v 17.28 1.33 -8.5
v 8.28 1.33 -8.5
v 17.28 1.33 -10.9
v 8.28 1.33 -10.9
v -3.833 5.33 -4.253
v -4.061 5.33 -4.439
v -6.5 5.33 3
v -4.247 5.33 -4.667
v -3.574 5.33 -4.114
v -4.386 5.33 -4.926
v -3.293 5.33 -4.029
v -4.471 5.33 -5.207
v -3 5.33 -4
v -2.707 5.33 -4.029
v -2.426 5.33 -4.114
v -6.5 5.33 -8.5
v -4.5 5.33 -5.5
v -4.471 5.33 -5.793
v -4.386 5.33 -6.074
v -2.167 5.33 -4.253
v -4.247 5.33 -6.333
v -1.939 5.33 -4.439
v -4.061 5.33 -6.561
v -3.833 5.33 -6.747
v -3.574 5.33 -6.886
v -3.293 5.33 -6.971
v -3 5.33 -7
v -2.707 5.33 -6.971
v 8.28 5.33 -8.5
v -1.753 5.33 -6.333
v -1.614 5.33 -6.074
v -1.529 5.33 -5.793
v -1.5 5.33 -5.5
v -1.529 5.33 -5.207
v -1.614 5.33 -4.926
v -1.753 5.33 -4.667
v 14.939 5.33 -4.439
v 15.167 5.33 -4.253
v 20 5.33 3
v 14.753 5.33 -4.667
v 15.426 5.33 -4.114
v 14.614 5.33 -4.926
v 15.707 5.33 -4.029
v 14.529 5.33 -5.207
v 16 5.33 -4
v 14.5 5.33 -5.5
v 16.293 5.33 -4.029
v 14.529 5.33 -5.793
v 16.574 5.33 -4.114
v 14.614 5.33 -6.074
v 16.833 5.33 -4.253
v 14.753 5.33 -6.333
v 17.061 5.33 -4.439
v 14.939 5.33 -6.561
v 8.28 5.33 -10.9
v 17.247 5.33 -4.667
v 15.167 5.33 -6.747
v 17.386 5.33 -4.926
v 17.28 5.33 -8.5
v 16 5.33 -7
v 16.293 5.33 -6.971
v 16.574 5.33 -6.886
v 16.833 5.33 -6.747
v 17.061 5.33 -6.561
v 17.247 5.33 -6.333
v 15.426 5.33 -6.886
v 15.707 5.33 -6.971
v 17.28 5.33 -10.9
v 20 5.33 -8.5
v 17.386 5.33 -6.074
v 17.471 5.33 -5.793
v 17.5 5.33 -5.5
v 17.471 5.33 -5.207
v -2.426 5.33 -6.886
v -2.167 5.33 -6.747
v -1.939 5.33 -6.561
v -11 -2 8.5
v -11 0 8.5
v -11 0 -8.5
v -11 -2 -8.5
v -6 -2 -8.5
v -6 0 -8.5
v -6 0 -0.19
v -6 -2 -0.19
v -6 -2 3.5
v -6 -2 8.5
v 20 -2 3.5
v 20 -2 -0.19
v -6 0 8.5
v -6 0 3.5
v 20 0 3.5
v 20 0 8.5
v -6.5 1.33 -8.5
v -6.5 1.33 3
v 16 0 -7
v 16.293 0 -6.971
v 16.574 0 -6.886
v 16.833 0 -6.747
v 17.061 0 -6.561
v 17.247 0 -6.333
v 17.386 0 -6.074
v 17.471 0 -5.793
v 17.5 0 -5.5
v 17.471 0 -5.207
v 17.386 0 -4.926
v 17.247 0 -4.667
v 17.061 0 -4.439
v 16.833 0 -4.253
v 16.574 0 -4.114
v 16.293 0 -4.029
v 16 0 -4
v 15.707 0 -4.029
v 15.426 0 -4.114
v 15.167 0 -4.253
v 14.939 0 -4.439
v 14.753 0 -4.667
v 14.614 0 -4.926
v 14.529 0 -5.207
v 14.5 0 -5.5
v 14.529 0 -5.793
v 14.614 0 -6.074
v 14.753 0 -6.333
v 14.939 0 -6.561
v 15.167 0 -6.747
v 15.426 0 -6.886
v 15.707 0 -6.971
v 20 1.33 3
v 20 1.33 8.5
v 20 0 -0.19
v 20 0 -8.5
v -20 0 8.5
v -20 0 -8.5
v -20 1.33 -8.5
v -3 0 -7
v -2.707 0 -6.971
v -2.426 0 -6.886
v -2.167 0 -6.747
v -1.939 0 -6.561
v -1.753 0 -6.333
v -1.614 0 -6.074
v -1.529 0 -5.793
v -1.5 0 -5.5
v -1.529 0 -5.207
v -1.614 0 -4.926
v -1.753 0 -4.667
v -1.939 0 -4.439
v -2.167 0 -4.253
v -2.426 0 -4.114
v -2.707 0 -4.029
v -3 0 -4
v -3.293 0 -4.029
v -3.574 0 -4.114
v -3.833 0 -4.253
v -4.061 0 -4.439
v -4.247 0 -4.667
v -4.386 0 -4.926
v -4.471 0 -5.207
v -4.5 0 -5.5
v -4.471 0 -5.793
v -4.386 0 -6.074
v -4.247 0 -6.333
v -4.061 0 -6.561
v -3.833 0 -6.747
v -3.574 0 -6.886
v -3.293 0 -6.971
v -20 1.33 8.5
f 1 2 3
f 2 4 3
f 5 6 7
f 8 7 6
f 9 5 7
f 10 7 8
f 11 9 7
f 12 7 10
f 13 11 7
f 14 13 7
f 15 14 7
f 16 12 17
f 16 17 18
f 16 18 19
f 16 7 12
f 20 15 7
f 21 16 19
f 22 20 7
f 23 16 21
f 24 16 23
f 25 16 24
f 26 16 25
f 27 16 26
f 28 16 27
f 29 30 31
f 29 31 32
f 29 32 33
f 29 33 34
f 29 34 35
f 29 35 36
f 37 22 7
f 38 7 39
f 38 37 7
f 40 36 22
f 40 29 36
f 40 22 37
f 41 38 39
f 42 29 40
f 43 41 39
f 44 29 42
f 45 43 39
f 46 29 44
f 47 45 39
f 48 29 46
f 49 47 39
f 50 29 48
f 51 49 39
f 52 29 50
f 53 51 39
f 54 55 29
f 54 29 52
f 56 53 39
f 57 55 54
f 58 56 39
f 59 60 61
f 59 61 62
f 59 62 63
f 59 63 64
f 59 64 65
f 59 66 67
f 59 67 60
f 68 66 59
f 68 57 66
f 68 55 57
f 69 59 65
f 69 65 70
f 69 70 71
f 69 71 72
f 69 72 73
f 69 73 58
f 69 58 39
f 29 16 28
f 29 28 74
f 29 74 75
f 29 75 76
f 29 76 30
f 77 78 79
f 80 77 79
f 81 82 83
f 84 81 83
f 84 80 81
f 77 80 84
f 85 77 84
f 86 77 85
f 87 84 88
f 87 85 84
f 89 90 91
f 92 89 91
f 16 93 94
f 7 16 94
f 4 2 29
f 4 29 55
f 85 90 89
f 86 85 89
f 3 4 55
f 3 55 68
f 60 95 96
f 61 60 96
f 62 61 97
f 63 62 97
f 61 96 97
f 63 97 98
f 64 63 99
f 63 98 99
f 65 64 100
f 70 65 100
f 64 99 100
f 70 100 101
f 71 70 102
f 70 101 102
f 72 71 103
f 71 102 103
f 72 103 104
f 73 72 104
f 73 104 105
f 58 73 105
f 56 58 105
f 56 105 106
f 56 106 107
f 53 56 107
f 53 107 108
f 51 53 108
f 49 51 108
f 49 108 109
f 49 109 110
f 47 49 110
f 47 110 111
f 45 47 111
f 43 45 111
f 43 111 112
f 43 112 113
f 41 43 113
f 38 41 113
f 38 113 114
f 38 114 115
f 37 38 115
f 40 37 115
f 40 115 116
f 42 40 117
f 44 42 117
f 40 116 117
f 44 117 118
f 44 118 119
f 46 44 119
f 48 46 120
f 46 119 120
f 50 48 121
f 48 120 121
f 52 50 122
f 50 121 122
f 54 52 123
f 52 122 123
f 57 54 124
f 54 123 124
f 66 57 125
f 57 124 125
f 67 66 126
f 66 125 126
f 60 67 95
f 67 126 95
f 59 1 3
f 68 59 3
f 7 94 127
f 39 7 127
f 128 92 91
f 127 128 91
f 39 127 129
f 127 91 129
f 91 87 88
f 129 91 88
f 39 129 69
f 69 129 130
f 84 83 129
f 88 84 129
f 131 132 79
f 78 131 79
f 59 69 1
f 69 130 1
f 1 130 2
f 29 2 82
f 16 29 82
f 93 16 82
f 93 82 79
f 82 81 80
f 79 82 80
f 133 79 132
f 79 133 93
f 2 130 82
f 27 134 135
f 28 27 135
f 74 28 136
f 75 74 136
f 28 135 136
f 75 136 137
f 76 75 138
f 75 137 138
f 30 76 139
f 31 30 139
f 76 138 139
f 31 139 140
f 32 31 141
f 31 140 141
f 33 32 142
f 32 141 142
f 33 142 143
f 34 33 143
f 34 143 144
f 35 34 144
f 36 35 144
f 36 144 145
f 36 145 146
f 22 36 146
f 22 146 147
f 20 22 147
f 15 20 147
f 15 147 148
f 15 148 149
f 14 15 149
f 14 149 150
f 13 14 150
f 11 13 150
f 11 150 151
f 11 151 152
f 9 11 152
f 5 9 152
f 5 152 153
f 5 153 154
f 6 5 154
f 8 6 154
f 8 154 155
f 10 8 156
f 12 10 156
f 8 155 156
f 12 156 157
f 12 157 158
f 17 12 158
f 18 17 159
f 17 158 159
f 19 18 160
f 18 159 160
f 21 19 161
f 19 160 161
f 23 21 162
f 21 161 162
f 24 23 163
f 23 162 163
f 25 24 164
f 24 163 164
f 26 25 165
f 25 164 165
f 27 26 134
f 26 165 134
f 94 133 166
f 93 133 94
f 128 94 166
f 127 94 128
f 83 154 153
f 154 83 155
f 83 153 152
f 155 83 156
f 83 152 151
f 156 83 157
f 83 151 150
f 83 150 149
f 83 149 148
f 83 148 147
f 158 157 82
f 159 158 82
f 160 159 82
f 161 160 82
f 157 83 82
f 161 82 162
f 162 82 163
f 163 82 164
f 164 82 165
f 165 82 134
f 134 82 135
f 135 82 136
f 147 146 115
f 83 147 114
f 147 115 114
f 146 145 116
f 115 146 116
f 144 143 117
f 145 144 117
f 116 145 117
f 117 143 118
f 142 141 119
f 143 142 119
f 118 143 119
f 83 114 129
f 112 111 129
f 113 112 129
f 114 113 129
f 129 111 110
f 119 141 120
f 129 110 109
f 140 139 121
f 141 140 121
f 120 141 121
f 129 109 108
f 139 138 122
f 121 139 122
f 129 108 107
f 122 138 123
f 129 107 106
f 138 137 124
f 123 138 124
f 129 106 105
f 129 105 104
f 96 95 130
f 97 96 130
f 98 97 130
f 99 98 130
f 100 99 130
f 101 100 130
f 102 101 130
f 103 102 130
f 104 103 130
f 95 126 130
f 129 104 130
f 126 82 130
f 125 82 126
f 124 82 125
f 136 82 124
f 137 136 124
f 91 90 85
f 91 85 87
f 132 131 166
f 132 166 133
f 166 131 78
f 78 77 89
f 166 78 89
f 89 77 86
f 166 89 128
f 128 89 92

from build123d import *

# Parameters (mm, degrees)
SKETCH_1_W          = 40
SKETCH_1_H          = 17
EXTRUDE_1_DEPTH     = 1.33
SKETCH_2_W          = 9
SKETCH_2_H          = 2.4
EXTRUDE_2_DEPTH     = 4
SKETCH_3_W          = 26
SKETCH_3_H          = 3.69
EXTRUDE_3_DEPTH     = 2
SKETCH_4_R          = 1.5
CUT_EXTRUDE_1_DEPTH = 24.392710403


with BuildPart() as part:
    # Эскиз1 → Бобышка-Вытянуть1 (new body)
    with BuildSketch(Plane(origin=(0, 0, 0), x_dir=(1, 0, 0), z_dir=(0, 1, 0))):
        Rectangle(SKETCH_1_W, SKETCH_1_H)
    extrude(amount=EXTRUDE_1_DEPTH)

    # Эскиз2 → Бобышка-Вытянуть2 (add)
    with BuildSketch(Plane(origin=(0, 1.33, 0), x_dir=(1, 0, 0), z_dir=(0, 1, 0))):
        Polygon((20, -3), (20, 8.5), (17.28, 8.5), (8.28, 8.5), (-6.5, 8.5), (-6.5, -3), align=None)
        with Locations((12.78, 9.7)):
            Rectangle(SKETCH_2_W, SKETCH_2_H)
    extrude(amount=EXTRUDE_2_DEPTH)

    # Эскиз3 → Бобышка-Вытянуть3 (add)
    with BuildSketch(Plane.XZ):
        Polygon((-11, -8.5), (-6, -8.5), (-6, -0.19), (-6, 3.5), (-6, 8.5), (-11, 8.5), align=None)
        with Locations((7, 1.655)):
            Rectangle(SKETCH_3_W, SKETCH_3_H)
    extrude(amount=EXTRUDE_3_DEPTH)

    # Эскиз4 → Вырез-Вытянуть1 (cut, through all)
    with BuildSketch(Plane.XZ):
        with Locations(Location((16, -5.5, 0), (0, 0, 270))):
            Circle(SKETCH_4_R)
        with Locations(Location((-3, -5.5, 0), (0, 0, 270))):
            Circle(SKETCH_4_R)
    extrude(amount=-CUT_EXTRUDE_1_DEPTH, mode=Mode.SUBTRACT)


solid = part.part
